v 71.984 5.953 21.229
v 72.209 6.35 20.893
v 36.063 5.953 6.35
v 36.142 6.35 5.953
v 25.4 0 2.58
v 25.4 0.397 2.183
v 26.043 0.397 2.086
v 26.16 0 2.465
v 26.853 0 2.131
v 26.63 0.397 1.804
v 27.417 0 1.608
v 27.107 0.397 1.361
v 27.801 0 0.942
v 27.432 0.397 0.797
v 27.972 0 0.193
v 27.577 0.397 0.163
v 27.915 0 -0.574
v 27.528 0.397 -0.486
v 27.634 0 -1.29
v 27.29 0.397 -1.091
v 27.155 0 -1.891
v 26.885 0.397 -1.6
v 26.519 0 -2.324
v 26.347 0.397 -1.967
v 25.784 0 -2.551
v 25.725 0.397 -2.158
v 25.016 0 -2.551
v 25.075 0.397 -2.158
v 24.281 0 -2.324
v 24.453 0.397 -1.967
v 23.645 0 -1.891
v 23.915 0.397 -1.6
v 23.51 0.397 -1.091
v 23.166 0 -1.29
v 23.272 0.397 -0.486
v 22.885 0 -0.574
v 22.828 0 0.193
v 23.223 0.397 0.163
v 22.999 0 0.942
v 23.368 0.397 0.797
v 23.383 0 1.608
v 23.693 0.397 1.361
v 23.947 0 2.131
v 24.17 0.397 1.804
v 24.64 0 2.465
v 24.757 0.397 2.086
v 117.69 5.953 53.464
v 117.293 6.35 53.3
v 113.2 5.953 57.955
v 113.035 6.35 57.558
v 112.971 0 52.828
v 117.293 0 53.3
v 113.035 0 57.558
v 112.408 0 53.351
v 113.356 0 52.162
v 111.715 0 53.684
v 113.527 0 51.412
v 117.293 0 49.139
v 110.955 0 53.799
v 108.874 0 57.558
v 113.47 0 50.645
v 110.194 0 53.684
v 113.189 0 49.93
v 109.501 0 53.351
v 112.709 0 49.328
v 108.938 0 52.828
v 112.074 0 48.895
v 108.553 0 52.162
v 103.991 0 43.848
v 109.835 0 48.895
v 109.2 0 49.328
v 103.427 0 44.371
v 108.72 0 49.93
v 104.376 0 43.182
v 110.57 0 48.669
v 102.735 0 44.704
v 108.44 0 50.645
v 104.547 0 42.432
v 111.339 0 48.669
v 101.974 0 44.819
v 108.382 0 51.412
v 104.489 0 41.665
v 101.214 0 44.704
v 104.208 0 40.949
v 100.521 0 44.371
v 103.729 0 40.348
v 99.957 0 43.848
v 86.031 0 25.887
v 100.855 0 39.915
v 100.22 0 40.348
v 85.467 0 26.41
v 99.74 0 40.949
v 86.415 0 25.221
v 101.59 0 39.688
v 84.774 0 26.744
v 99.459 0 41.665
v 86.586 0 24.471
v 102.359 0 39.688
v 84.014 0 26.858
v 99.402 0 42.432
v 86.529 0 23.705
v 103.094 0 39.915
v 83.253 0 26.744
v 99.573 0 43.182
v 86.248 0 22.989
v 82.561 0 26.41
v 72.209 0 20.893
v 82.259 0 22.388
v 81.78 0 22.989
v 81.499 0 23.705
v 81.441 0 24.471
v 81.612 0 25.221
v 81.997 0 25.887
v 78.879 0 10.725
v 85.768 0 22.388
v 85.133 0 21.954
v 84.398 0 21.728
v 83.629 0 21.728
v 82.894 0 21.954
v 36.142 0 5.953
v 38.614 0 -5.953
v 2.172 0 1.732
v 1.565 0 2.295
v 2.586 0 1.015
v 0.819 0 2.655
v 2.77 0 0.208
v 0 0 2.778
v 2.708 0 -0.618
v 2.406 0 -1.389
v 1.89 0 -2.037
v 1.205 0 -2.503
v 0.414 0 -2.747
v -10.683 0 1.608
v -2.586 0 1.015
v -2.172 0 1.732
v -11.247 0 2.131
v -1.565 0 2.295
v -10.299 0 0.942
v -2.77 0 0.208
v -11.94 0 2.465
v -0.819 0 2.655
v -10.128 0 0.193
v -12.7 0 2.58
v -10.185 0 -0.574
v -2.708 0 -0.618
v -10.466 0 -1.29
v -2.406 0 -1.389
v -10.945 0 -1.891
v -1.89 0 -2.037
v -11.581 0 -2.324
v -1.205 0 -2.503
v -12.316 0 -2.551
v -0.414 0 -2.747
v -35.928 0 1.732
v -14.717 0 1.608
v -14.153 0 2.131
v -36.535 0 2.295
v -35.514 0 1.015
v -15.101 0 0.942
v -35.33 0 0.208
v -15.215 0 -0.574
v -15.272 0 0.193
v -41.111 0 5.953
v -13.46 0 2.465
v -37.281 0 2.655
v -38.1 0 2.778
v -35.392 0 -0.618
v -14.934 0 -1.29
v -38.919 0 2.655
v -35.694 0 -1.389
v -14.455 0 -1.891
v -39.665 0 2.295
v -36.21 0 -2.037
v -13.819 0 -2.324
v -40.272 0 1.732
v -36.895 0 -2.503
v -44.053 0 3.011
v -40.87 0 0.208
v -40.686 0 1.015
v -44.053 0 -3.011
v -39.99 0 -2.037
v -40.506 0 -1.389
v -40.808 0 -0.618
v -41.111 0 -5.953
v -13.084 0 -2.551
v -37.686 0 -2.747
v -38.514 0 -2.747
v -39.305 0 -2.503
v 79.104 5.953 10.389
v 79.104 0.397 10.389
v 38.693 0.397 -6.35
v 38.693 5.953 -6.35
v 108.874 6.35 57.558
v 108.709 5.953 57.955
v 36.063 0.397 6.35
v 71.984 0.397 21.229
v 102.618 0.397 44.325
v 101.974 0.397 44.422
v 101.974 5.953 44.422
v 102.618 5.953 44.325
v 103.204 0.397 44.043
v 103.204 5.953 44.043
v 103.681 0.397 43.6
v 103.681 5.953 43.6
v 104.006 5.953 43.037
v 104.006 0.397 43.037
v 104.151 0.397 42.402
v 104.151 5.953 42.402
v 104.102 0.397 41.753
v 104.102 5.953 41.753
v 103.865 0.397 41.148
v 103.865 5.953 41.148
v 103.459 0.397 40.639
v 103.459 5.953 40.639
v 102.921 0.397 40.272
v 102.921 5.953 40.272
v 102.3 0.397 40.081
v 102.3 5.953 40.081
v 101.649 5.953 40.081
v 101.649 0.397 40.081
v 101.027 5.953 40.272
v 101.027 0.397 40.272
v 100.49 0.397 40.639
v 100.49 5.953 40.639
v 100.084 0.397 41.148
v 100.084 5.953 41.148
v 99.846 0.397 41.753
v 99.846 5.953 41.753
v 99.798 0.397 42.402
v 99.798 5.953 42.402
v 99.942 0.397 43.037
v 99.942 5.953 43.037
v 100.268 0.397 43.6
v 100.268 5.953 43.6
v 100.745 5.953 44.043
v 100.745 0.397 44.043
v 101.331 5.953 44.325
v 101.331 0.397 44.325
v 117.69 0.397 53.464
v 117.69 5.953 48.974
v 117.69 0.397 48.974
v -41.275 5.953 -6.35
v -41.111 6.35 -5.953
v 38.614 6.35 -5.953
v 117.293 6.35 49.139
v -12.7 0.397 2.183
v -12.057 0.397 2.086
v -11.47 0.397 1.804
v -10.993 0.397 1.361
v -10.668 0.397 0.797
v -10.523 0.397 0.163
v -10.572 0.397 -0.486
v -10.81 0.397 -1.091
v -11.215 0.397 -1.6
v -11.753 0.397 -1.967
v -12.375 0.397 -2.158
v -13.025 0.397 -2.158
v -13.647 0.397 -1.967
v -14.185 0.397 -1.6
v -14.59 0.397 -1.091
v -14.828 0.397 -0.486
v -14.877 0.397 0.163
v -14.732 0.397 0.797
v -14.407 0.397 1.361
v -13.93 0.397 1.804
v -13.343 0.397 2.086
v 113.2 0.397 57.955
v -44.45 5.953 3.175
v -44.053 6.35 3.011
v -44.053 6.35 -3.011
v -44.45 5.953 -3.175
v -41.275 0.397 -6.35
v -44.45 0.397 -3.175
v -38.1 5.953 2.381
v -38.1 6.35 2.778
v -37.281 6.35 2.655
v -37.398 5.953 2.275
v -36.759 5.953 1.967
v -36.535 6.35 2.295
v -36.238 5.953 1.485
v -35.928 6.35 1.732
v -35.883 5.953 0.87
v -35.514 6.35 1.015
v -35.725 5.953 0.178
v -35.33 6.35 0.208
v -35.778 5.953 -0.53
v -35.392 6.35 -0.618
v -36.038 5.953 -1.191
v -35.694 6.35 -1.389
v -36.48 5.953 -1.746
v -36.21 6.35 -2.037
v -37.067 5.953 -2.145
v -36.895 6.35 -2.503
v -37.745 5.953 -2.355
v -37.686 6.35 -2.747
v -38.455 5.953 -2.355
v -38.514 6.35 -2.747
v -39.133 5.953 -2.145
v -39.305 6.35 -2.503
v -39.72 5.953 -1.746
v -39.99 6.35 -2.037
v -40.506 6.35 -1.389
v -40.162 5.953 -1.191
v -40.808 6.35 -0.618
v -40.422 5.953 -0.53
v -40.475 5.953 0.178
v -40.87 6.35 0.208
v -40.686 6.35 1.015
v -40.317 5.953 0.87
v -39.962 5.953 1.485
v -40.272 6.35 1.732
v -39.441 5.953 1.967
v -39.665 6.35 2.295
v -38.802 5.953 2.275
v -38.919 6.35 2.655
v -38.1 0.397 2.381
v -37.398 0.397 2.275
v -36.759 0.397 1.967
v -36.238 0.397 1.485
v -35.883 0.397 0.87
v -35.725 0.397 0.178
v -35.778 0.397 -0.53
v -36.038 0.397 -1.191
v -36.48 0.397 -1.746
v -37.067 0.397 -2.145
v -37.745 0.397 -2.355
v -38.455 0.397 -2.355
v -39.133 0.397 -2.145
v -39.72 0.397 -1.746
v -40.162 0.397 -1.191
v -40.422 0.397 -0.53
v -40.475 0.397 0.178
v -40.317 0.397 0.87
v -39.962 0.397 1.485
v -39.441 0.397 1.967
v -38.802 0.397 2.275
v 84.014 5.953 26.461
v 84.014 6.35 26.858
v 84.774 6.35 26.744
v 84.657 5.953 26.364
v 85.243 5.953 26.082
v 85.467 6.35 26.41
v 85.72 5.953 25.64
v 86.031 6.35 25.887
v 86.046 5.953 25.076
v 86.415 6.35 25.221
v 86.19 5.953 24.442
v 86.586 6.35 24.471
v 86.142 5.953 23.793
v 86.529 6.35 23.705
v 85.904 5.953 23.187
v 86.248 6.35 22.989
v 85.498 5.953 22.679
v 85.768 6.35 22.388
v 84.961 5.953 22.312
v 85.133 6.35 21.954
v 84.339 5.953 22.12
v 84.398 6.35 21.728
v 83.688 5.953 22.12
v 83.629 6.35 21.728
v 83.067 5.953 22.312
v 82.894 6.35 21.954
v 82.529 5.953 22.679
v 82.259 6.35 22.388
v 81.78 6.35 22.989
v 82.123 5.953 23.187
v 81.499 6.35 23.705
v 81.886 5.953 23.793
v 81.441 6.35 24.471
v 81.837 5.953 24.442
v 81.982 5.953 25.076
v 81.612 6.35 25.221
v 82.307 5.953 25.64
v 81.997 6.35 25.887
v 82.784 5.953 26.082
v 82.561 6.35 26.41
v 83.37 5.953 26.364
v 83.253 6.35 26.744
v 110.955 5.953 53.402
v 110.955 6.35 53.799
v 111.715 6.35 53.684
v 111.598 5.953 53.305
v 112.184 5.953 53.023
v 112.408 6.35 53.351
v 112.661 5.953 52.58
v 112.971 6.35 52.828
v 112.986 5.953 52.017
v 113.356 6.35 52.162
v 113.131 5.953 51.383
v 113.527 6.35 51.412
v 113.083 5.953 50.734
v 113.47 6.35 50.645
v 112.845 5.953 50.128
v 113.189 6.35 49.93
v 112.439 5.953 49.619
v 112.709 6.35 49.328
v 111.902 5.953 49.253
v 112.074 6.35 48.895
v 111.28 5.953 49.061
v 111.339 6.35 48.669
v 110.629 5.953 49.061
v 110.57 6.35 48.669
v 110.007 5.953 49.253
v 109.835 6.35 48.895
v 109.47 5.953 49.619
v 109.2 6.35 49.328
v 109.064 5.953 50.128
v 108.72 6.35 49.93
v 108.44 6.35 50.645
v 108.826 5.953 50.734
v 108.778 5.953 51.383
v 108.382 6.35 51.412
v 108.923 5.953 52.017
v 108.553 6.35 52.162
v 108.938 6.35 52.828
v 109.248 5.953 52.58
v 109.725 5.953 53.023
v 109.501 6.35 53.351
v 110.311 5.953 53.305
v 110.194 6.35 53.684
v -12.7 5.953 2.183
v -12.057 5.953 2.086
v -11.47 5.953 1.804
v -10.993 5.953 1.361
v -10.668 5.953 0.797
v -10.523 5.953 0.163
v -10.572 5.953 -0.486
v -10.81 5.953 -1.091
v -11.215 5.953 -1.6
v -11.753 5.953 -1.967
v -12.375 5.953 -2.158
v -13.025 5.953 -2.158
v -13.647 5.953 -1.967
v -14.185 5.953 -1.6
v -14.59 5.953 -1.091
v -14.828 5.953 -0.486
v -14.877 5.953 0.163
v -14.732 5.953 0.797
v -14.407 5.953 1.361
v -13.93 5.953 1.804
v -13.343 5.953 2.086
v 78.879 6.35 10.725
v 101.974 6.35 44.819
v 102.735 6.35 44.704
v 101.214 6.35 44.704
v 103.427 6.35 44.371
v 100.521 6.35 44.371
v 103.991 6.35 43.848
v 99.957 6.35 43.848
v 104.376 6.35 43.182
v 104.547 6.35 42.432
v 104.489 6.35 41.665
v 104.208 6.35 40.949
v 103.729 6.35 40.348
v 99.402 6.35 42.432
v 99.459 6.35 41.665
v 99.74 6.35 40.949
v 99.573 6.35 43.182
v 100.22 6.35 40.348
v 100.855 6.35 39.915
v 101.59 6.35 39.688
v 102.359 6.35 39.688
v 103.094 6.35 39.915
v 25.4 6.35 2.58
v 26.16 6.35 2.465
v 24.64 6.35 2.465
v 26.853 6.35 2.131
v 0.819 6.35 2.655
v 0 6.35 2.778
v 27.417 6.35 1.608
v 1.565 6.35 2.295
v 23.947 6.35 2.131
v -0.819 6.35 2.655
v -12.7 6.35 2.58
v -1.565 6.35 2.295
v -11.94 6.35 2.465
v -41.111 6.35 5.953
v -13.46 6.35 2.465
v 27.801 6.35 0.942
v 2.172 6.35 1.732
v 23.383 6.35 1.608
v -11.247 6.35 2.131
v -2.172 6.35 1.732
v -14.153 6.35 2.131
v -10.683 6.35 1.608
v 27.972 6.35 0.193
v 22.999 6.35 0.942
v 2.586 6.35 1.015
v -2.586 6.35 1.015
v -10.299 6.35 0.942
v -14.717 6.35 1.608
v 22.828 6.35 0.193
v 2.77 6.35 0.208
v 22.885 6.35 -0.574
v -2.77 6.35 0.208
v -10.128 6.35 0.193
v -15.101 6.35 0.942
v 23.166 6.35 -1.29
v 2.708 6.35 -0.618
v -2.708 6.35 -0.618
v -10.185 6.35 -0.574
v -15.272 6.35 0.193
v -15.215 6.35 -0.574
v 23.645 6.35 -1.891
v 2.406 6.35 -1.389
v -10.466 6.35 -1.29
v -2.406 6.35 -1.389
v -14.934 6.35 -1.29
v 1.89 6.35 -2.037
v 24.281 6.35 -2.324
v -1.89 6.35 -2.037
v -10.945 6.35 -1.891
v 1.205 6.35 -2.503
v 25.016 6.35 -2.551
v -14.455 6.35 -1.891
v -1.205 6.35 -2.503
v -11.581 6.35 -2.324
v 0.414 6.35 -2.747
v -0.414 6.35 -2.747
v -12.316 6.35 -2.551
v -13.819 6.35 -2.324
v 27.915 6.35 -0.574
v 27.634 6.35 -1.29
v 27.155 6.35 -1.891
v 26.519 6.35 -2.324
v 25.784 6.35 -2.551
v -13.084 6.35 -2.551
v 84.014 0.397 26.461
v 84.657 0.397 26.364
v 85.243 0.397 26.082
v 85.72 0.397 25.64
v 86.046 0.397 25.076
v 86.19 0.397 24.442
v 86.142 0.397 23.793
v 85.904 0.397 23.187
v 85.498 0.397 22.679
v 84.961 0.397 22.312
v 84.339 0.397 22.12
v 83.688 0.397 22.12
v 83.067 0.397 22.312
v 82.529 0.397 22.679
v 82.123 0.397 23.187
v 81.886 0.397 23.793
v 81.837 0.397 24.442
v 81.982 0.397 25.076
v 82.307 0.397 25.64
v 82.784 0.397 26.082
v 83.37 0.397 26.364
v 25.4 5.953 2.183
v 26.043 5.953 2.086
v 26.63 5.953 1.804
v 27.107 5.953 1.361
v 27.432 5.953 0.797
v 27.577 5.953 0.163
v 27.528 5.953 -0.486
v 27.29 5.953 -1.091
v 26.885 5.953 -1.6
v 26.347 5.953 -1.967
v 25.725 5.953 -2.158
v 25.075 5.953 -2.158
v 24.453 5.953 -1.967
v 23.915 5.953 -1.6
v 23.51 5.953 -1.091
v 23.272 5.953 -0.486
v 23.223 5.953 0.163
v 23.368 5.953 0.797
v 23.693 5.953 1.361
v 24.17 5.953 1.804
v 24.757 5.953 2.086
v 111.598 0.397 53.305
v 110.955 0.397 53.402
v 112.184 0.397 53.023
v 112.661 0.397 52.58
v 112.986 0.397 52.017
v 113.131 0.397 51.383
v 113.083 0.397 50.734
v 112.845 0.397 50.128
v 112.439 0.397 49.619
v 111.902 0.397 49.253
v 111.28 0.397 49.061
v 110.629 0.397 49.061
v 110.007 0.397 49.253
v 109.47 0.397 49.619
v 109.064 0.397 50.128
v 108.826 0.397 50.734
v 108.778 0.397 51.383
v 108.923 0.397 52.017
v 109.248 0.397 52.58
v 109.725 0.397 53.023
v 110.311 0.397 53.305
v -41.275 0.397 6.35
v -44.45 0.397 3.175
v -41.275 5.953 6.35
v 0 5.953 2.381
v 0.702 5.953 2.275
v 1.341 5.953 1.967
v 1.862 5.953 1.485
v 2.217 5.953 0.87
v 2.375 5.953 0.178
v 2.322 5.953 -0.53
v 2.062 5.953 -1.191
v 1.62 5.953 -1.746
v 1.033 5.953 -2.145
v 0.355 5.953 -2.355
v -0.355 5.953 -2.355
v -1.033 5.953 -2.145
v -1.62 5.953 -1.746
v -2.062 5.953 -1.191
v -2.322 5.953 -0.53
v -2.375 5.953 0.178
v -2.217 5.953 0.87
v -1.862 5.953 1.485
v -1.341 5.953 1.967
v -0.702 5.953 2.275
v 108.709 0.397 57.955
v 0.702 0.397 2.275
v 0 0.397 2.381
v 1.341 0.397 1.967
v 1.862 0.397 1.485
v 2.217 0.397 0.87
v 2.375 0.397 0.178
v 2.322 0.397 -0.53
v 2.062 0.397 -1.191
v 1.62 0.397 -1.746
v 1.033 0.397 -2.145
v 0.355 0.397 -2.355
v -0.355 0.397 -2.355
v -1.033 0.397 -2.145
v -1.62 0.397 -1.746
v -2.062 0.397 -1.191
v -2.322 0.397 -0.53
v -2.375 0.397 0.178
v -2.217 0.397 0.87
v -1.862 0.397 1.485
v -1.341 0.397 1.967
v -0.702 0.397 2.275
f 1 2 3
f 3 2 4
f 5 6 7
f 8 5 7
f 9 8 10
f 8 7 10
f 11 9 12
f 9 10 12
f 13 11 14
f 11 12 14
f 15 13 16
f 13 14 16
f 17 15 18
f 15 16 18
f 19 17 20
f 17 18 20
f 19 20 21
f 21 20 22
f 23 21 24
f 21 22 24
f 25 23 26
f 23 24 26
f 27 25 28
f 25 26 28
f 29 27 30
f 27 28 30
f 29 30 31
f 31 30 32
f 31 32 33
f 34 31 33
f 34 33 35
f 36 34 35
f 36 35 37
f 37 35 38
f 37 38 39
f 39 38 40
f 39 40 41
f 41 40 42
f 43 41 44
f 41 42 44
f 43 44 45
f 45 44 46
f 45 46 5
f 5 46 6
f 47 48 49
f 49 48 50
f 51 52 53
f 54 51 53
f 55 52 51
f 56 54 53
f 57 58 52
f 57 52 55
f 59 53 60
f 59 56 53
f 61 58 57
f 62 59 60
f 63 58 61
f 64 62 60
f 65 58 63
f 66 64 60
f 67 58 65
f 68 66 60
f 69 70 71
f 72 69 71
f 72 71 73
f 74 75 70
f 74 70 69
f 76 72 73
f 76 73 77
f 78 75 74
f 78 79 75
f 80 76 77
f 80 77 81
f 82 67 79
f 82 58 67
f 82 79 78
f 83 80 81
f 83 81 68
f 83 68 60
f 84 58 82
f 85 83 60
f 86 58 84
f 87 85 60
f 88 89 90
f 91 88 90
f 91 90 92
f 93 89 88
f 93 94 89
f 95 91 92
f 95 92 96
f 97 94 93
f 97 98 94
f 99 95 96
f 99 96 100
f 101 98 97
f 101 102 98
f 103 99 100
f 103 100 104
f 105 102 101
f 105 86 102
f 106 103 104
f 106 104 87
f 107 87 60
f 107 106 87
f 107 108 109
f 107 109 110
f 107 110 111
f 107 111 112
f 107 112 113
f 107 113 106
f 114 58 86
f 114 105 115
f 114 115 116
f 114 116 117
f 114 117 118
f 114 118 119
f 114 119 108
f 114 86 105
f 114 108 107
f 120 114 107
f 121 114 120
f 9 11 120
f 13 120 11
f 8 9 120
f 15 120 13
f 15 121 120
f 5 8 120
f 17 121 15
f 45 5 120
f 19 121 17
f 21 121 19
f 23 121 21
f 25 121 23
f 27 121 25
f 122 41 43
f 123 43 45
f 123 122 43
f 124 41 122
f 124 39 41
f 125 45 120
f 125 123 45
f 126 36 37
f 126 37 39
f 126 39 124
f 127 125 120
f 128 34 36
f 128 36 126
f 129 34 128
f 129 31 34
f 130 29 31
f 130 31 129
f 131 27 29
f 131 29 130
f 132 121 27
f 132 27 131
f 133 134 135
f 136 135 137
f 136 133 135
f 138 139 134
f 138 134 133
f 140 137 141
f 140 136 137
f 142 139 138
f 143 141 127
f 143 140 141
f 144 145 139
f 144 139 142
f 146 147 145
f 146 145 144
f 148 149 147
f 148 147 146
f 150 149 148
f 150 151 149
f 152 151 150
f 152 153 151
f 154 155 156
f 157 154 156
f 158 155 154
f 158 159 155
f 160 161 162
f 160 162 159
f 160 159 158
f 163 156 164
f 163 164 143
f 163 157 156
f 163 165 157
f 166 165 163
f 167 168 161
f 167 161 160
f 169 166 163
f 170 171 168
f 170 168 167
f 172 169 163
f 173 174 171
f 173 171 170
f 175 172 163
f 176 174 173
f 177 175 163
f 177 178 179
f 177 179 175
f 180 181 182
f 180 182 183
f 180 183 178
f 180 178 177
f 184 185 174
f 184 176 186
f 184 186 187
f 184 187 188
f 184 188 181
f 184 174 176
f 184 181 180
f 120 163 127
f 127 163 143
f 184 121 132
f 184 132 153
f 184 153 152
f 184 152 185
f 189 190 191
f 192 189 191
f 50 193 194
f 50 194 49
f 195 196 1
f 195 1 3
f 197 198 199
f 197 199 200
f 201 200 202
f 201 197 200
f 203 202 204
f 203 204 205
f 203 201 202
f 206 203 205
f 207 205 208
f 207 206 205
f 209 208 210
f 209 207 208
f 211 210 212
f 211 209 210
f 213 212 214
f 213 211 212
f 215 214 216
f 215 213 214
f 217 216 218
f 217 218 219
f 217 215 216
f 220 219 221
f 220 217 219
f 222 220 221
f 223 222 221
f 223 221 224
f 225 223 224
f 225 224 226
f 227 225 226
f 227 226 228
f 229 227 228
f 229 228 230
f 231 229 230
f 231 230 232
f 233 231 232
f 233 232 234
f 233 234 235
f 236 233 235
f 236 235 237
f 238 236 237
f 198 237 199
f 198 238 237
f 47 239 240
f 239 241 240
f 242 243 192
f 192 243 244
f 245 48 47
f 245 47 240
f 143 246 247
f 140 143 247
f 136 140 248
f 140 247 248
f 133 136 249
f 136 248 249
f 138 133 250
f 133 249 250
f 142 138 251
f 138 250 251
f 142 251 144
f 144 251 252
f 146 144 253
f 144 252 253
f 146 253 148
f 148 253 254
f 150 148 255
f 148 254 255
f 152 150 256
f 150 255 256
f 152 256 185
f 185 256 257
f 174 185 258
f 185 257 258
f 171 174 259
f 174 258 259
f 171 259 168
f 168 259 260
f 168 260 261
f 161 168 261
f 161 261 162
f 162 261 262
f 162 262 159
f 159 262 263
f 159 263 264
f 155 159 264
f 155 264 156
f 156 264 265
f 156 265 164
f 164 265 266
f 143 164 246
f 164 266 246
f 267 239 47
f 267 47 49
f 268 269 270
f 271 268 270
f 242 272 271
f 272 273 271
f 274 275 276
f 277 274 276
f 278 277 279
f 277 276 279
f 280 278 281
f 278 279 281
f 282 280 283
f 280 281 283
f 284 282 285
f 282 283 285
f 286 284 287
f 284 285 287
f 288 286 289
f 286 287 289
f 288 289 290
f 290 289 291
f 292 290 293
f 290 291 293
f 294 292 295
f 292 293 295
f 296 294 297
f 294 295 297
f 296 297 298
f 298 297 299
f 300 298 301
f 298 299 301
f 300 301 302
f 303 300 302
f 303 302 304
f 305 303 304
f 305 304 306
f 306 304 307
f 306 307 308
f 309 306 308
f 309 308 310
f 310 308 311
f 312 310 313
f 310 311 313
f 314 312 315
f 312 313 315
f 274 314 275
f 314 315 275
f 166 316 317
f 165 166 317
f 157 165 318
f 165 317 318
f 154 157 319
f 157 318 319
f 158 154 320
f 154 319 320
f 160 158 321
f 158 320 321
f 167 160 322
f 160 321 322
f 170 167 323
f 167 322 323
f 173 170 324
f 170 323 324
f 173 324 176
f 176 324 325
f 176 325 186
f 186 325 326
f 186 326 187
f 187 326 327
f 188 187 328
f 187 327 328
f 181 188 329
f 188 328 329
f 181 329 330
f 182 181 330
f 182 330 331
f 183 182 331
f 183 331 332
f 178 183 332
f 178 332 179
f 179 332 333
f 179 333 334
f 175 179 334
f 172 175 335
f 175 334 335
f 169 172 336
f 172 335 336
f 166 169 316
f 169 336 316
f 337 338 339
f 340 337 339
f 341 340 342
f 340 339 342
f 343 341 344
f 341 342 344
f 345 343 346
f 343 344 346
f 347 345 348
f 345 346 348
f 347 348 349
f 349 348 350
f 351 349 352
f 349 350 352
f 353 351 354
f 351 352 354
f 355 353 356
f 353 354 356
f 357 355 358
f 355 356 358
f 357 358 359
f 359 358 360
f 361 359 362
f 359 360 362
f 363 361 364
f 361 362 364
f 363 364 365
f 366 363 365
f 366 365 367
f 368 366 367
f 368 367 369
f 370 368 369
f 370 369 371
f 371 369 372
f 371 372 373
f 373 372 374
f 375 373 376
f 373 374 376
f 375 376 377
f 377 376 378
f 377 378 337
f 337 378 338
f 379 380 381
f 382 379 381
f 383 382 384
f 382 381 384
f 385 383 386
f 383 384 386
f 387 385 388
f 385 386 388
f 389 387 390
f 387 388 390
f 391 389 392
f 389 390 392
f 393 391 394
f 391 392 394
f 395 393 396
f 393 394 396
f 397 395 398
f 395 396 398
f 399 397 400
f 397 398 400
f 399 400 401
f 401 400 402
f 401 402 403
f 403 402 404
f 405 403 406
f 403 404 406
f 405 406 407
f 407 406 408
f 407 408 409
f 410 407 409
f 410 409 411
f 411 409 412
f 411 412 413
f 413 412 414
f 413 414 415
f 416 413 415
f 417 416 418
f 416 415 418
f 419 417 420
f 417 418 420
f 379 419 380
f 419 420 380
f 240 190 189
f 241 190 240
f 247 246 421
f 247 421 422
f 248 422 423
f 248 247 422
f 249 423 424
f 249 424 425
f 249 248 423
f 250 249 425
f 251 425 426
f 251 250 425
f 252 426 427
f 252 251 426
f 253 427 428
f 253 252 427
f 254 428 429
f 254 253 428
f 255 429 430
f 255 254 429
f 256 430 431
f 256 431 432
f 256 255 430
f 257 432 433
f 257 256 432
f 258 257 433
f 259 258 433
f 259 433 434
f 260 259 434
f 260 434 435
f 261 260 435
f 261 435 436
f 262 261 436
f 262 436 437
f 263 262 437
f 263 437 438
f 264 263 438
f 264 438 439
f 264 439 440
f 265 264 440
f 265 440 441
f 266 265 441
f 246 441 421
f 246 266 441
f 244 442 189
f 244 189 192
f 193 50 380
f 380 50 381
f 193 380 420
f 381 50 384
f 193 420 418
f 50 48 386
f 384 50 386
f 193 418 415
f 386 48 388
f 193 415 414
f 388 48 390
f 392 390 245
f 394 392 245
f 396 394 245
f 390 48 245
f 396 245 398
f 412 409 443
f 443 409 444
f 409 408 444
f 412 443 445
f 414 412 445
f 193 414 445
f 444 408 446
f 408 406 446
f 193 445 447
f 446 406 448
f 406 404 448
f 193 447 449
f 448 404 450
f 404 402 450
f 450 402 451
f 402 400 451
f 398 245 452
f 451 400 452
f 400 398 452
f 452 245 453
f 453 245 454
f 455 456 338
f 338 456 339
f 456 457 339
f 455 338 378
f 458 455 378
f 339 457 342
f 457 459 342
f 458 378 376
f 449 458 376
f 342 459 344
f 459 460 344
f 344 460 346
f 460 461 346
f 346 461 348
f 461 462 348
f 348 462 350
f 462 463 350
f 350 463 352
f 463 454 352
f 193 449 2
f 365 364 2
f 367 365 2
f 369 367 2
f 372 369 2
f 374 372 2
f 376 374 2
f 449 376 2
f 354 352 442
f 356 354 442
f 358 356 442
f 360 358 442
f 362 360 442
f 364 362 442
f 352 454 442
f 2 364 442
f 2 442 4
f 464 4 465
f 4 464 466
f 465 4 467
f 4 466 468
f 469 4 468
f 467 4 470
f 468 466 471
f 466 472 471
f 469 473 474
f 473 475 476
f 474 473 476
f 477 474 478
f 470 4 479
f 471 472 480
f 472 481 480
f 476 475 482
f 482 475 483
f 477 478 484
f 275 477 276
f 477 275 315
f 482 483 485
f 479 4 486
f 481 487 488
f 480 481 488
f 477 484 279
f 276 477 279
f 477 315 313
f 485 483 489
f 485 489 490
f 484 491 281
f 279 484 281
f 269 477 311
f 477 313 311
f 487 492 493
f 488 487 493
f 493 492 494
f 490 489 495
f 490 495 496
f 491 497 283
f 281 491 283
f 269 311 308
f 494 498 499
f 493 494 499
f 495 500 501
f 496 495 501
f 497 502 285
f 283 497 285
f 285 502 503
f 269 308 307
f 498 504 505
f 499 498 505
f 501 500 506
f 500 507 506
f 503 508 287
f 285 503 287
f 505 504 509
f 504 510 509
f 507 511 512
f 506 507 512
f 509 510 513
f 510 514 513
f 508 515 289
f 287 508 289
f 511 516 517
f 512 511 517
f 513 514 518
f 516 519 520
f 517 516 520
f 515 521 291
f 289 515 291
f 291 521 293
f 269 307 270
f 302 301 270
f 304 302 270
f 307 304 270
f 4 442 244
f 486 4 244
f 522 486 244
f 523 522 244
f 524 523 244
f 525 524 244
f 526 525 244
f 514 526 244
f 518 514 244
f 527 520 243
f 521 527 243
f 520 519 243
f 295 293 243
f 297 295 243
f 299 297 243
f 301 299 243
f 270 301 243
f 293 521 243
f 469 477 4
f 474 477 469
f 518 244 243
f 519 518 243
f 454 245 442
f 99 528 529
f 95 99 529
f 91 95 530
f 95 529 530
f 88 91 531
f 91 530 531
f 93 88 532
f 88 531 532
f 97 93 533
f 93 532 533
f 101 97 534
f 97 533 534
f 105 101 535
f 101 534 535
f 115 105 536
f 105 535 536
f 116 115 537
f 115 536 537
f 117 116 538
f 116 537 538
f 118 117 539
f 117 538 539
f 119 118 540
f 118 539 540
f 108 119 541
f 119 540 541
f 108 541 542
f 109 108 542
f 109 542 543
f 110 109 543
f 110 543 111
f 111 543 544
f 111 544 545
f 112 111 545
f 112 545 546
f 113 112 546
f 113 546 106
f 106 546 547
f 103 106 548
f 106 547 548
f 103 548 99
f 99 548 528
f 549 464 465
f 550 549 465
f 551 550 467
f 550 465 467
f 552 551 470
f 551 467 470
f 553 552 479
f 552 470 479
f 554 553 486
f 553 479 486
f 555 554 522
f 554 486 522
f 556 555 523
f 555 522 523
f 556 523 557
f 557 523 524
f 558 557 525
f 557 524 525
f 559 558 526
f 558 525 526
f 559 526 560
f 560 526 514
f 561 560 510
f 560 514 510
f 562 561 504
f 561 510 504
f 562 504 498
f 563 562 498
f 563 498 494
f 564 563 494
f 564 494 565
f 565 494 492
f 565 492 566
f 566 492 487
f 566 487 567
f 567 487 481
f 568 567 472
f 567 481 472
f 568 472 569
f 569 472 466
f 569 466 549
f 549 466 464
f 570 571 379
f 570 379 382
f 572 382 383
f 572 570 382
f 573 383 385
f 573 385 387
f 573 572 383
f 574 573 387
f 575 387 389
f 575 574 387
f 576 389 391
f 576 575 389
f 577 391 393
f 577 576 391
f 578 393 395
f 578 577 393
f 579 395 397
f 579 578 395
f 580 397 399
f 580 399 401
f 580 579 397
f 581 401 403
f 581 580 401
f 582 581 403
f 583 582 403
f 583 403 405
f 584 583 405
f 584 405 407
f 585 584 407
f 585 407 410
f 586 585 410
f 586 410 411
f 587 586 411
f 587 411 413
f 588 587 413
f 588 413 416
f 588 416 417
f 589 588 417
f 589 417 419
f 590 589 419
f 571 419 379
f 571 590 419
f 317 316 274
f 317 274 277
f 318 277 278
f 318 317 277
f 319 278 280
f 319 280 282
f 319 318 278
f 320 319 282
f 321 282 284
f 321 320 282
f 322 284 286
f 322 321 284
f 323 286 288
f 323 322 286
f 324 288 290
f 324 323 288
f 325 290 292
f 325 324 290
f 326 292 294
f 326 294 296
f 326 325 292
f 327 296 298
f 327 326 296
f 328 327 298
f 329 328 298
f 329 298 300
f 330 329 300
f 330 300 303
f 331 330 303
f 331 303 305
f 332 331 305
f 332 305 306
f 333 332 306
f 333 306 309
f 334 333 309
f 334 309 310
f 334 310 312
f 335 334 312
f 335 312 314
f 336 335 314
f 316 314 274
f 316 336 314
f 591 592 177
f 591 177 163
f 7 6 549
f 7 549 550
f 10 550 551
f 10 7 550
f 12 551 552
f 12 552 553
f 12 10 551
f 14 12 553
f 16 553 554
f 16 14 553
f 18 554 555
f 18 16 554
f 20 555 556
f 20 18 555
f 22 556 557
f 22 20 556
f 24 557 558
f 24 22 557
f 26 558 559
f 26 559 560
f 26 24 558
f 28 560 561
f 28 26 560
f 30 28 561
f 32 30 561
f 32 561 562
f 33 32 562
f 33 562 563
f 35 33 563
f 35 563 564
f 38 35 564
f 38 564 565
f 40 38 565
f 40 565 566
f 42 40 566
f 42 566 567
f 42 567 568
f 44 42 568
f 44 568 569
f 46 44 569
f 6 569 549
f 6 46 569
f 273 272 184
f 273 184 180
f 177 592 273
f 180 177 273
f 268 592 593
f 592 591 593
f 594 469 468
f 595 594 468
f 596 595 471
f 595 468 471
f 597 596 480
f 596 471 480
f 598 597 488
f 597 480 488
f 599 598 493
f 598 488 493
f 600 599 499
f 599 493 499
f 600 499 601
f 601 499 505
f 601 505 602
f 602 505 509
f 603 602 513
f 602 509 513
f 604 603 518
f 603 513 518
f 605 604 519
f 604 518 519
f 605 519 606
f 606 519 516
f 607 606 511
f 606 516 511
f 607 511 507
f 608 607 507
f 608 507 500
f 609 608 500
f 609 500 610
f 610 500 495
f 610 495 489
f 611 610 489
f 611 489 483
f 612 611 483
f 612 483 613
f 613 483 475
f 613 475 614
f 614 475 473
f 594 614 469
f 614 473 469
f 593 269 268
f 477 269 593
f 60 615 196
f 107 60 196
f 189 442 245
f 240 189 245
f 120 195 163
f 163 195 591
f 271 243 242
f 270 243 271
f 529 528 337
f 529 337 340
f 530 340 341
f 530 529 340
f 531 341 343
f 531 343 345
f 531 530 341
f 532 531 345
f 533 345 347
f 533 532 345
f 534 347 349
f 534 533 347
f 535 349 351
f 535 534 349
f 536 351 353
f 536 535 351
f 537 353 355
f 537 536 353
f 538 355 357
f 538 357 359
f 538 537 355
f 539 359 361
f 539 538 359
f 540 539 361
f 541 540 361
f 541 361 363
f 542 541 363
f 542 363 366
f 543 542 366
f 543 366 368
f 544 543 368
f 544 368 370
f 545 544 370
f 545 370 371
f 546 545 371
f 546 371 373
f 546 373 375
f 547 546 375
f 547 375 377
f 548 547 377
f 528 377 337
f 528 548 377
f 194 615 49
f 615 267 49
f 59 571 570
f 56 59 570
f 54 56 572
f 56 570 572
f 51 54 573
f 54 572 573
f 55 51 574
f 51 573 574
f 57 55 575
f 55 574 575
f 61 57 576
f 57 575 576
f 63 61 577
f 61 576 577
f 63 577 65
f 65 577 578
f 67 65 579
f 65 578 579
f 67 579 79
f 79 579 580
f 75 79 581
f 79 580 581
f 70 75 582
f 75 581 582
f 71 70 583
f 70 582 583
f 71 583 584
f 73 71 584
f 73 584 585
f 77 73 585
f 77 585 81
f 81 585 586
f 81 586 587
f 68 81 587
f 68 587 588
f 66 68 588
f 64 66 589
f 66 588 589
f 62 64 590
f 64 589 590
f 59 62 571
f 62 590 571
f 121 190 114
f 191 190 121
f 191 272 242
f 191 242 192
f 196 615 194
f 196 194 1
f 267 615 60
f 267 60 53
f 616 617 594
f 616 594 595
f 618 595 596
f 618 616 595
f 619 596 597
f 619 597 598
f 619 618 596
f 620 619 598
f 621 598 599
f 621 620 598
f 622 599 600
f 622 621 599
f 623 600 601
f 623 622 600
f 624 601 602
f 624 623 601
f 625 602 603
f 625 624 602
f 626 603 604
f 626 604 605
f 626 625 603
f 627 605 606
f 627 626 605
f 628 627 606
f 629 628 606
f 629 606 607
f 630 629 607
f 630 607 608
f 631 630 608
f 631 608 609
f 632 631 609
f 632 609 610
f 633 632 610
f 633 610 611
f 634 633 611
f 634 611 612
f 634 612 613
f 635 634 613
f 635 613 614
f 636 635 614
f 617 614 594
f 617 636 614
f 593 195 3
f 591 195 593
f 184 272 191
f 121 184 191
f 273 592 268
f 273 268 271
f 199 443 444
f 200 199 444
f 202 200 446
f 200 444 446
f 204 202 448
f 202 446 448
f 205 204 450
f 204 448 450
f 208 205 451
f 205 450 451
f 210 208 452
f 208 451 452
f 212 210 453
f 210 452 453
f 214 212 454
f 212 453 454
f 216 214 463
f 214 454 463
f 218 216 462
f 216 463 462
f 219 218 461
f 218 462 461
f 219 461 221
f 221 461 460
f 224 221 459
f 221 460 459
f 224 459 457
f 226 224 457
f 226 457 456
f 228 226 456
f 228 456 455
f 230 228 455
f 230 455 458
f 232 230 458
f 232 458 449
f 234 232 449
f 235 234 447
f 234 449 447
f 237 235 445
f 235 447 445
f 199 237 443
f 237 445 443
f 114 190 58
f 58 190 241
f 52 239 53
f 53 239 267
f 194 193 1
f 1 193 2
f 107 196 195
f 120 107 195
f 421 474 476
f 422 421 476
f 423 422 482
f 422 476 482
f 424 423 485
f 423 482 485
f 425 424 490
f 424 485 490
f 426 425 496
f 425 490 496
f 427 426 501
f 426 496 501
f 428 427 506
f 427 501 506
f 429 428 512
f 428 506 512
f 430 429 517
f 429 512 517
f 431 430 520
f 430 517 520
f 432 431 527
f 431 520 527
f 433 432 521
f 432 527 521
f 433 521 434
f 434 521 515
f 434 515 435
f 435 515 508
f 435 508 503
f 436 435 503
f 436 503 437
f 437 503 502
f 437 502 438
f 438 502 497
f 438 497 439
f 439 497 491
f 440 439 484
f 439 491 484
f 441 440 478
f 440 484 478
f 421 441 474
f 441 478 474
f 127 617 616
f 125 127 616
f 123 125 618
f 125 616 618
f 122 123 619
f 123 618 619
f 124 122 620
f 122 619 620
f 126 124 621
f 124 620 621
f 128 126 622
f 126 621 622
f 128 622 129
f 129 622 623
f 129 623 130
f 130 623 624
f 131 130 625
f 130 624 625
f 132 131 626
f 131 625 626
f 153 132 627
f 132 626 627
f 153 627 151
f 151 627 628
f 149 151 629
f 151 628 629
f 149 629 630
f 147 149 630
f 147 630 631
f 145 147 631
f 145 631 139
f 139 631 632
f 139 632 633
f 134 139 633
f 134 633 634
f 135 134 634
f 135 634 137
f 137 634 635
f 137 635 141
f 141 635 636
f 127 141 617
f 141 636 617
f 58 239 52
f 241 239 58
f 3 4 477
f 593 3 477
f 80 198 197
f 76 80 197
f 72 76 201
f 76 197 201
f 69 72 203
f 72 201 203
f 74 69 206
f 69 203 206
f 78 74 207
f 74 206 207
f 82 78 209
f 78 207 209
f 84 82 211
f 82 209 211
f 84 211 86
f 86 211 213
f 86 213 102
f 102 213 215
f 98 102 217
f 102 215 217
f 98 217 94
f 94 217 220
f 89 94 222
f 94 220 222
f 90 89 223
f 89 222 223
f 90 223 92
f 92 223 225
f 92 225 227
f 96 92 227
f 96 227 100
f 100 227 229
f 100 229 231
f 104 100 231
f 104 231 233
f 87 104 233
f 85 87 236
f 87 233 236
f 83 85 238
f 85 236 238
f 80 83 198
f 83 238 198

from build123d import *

# Parameters (mm, degrees)
SKETCH1_R           = 2.38125
SKETCH1_R_2         = 2.1828125
BOSS_EXTRUDE1_DEPTH = 6.35
CHAMFER1_SIZE       = 3.175
CHAMFER2_SIZE       = 0.396875


with BuildPart() as part:
    # Sketch1 → Boss-Extrude1 (new body)
    with BuildSketch(Plane(origin=(0, 0, 0), x_dir=(1, 0, 0), z_dir=(0, 1, 0))):
        Polygon((-44.45, 6.35), (62.365403734, 6.35), (119.934787808, -51.219384074), (110.954531687, -60.199640195), (57.104891492, -6.35), (-44.45, -6.35), align=None)
        with Locations(Location((-38.1, 0, 0), (0, 0, 270))):
            Circle(SKETCH1_R, mode=Mode.SUBTRACT)
        with Locations(Location((0, 0, 0), (0, 0, 270))):
            Circle(SKETCH1_R, mode=Mode.SUBTRACT)
        with Locations(Location((110.954531687, -51.219384074, 0), (0, 0, 270))):
            Circle(SKETCH1_R_2, mode=Mode.SUBTRACT)
        with Locations(Location((101.974275566, -42.239127953, 0), (0, 0, 270))):
            Circle(SKETCH1_R_2, mode=Mode.SUBTRACT)
        with Locations(Location((-12.7, 0, 0), (0, 0, 270))):
            Circle(SKETCH1_R_2, mode=Mode.SUBTRACT)
        with Locations(Location((25.4, 0, 0), (0, 0, 270))):
            Circle(SKETCH1_R_2, mode=Mode.SUBTRACT)
        with Locations(Location((84.013763324, -24.27861571, 0), (0, 0, 270))):
            Circle(SKETCH1_R_2, mode=Mode.SUBTRACT)
    extrude(amount=BOSS_EXTRUDE1_DEPTH)

    # Fillet1
    # the kernel refuses this chamfer: 50.8 mm, written as the material it adds along each edge
    with BuildSketch(Plane(origin=(57.104891492, 0, 6.35), x_dir=(0.7306772036716535, 0, 0.6827230946984092), z_dir=(0, 1, 0))) as fillet1_piece_1:
        with BuildLine():
            Line((22.93255988, 0), (-17.277556946, -15.079400804))
            Line((-17.277556946, -15.079400804), (-17.97120361, -14.337032765))
            ThreePointArc((-17.97120361, -14.337032765), (-9.066978051, -7.081424312), (-0.693646664, 0.742368039))
            Line((-0.693646664, 0.742368039), (0.034451214, 1.015415734))
            ThreePointArc((0.034451214, 1.015415734), (11.487547245, 0.626832956), (22.967011094, 1.015415734))
            Line((22.967011094, 1.015415734), (22.93255988, 0))
        make_face()
    extrude(amount=6.35)

    # Fillet2
    # the kernel refuses this chamfer: 57.15 mm, written as the material it takes off along each edge
    with BuildSketch(Plane(origin=(62.365403734, -64.497824661, -6.35), x_dir=(0.7306772036716533, 0, 0.6827230946984093), z_dir=(0, 1, 0))) as fillet2_piece_1:
        with BuildLine():
            Line((25.799129864, 0), (-19.437251564, -16.964325904))
            Line((-19.437251564, -16.964325904), (-20.217604061, -16.129161861))
            ThreePointArc((-20.217604061, -16.129161861), (-10.200350307, -7.966602351), (-0.780352497, 0.835164044))
            Line((-0.780352497, 0.835164044), (0.038757616, 1.142342701))
            ThreePointArc((0.038757616, 1.142342701), (12.923490651, 0.705187075), (25.837887481, 1.142342701))
            Line((25.837887481, 1.142342701), (25.799129864, 0))
        make_face()
    extrude(amount=135.345649322, mode=Mode.SUBTRACT)

    # Chamfer1
    chamfer1_edges = [part.edges().sort_by_distance(p)[0] for p in [
        (-44.45, 3.175, -6.35),
        (119.934787808, 3.175, 51.219384074),
        (110.954531687, 3.175, 60.199640195),
        (-44.45, 3.175, 6.35),
    ]]
    chamfer(chamfer1_edges, length=CHAMFER1_SIZE)

    # Chamfer2
    chamfer2_edges = [part.edges().sort_by_distance(p)[0] for p in [
        (0, 0, -2.38125),
        (0, 6.35, -2.38125),
        (-38.1, 0, -2.38125),
        (-38.1, 6.35, -2.38125),
        (110.954531687, 0, 49.036571574),
        (110.954531687, 6.35, 49.036571574),
        (101.974275566, 0, 40.056315453),
        (101.974275566, 6.35, 40.056315453),
        (-12.7, 0, -2.1828125),
        (-12.7, 6.35, -2.1828125),
        (25.4, 0, -2.1828125),
        (25.4, 6.35, -2.1828125),
        (84.013763324, 0, 22.09580321),
        (84.013763324, 6.35, 22.09580321),
        (90.346667332, 0, 39.59177584),
        (90.346667332, 6.35, 39.59177584),
        (54.023354766, 0, 13.789487758),
        (54.023354766, 6.35, 13.789487758),
        (-1.290950678, 0, -6.35),
        (-1.290950678, 6.35, -6.35),
        (58.898674917, 0, 2.019423728),
        (58.898674917, 6.35, 2.019423728),
        (-44.45, 0, 0),
        (-44.45, 6.35, 0),
        (98.396987484, 0, 29.681583749),
        (115.444659748, 0, 55.709512134),
        (-2.606078738, 0, 6.35),
        (117.689723778, 0, 51.219384074),
        (110.954531687, 0, 57.954576164),
        (-42.8625, 0, 4.7625),
        (-42.8625, 0, -4.7625),
        (98.396987484, 6.35, 29.681583749),
        (-2.606078738, 6.35, 6.35),
        (115.444659748, 6.35, 55.709512134),
        (117.689723778, 6.35, 51.219384074),
        (110.954531687, 6.35, 57.954576164),
        (-42.8625, 6.35, 4.7625),
        (-42.8625, 6.35, -4.7625),
    ]]
    chamfer(chamfer2_edges, length=CHAMFER2_SIZE)


solid = part.part
